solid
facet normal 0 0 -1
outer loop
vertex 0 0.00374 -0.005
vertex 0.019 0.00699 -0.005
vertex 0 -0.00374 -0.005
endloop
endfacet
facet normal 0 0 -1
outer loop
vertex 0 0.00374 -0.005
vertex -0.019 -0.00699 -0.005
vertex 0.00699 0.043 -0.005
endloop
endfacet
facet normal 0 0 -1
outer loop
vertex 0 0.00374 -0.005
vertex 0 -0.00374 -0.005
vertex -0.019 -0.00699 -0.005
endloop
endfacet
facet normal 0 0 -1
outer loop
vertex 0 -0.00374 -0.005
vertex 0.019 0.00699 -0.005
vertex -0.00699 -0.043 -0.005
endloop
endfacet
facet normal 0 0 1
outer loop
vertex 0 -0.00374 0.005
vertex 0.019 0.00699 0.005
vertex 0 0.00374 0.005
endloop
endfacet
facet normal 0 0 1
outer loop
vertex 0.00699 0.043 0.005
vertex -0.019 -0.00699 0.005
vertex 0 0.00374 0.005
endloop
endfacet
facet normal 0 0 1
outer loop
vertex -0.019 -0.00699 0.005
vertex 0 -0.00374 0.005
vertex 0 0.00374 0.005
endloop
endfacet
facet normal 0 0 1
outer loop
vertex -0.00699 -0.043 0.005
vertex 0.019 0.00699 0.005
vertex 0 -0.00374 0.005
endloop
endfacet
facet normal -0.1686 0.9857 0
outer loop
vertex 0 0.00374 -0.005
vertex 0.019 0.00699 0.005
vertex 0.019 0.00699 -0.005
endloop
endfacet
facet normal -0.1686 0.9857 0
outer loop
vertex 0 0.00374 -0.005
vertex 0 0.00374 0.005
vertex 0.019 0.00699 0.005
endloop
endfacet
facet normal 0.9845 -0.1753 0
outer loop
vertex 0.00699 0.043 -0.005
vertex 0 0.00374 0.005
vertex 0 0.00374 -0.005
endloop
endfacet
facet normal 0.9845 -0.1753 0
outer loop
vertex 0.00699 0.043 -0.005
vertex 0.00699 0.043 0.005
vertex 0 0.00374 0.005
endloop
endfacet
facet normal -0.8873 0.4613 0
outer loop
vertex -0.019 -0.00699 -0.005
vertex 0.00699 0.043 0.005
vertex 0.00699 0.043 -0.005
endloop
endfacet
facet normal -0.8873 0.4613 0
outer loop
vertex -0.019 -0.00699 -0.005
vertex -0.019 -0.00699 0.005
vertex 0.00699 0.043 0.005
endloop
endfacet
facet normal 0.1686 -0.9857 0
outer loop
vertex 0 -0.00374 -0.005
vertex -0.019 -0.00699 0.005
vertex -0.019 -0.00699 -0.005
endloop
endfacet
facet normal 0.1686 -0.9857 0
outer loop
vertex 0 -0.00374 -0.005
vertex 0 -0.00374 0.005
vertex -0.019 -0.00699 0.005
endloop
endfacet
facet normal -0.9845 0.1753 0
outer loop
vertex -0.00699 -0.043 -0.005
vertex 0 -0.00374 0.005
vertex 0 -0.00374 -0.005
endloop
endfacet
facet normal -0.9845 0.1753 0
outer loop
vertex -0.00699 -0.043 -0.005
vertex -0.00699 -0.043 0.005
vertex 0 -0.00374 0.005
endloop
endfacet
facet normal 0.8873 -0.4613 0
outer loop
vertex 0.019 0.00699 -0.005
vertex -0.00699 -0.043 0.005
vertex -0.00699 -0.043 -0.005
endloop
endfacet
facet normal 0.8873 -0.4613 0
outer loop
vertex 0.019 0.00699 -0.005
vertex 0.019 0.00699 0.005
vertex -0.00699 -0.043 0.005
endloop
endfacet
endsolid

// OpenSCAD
symWidth = 0.038;
symHeight = 0.086;
symDepth = 0.01;
middleHeight = 0.0075;
topHorizOffset = 0.007;
sideVertOffset = 0.007;

module PowerSymbol() {
  linear_extrude(symDepth, center=true) {
    halfHei = symHeight/2;
    halfWid = symWidth/2;
    halfMid = middleHeight/2;
    polygon([
      [topHorizOffset, halfHei],
      [0, halfMid],
      [halfWid, sideVertOffset],
      [-topHorizOffset, -halfHei],
      [0, -halfMid],
      [-halfWid, -sideVertOffset]
    ]);
  }
}

PowerSymbol();
